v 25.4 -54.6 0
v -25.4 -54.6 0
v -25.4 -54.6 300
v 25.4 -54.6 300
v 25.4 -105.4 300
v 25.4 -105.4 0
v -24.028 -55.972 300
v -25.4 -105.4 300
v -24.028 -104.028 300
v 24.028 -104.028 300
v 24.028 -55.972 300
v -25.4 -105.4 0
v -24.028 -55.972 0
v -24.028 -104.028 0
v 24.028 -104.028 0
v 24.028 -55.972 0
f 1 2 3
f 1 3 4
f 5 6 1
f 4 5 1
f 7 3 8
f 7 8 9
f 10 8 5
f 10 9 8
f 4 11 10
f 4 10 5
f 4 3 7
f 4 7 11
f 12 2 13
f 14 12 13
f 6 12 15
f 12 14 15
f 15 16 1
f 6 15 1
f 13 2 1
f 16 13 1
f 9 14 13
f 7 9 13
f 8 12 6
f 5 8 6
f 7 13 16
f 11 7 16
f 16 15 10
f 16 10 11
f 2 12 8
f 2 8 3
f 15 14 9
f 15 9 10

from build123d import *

# Parameters (mm, degrees)
CROQUIS1_W              = 50.8
CROQUIS1_H              = 50.8
CROQUIS1_W_2            = 48.0568
CROQUIS1_H_2            = 48.0568
SALIENTE_EXTRUIR1_DEPTH = 300


with BuildPart() as part:
    # Croquis1 → Saliente-Extruir1 (new body)
    with BuildSketch(Plane.XY):
        with Locations((0, -80)):
            Rectangle(CROQUIS1_W, CROQUIS1_H)
        with Locations((0, -80)):
            Rectangle(CROQUIS1_W_2, CROQUIS1_H_2, mode=Mode.SUBTRACT)
    extrude(amount=SALIENTE_EXTRUIR1_DEPTH)


solid = part.part
